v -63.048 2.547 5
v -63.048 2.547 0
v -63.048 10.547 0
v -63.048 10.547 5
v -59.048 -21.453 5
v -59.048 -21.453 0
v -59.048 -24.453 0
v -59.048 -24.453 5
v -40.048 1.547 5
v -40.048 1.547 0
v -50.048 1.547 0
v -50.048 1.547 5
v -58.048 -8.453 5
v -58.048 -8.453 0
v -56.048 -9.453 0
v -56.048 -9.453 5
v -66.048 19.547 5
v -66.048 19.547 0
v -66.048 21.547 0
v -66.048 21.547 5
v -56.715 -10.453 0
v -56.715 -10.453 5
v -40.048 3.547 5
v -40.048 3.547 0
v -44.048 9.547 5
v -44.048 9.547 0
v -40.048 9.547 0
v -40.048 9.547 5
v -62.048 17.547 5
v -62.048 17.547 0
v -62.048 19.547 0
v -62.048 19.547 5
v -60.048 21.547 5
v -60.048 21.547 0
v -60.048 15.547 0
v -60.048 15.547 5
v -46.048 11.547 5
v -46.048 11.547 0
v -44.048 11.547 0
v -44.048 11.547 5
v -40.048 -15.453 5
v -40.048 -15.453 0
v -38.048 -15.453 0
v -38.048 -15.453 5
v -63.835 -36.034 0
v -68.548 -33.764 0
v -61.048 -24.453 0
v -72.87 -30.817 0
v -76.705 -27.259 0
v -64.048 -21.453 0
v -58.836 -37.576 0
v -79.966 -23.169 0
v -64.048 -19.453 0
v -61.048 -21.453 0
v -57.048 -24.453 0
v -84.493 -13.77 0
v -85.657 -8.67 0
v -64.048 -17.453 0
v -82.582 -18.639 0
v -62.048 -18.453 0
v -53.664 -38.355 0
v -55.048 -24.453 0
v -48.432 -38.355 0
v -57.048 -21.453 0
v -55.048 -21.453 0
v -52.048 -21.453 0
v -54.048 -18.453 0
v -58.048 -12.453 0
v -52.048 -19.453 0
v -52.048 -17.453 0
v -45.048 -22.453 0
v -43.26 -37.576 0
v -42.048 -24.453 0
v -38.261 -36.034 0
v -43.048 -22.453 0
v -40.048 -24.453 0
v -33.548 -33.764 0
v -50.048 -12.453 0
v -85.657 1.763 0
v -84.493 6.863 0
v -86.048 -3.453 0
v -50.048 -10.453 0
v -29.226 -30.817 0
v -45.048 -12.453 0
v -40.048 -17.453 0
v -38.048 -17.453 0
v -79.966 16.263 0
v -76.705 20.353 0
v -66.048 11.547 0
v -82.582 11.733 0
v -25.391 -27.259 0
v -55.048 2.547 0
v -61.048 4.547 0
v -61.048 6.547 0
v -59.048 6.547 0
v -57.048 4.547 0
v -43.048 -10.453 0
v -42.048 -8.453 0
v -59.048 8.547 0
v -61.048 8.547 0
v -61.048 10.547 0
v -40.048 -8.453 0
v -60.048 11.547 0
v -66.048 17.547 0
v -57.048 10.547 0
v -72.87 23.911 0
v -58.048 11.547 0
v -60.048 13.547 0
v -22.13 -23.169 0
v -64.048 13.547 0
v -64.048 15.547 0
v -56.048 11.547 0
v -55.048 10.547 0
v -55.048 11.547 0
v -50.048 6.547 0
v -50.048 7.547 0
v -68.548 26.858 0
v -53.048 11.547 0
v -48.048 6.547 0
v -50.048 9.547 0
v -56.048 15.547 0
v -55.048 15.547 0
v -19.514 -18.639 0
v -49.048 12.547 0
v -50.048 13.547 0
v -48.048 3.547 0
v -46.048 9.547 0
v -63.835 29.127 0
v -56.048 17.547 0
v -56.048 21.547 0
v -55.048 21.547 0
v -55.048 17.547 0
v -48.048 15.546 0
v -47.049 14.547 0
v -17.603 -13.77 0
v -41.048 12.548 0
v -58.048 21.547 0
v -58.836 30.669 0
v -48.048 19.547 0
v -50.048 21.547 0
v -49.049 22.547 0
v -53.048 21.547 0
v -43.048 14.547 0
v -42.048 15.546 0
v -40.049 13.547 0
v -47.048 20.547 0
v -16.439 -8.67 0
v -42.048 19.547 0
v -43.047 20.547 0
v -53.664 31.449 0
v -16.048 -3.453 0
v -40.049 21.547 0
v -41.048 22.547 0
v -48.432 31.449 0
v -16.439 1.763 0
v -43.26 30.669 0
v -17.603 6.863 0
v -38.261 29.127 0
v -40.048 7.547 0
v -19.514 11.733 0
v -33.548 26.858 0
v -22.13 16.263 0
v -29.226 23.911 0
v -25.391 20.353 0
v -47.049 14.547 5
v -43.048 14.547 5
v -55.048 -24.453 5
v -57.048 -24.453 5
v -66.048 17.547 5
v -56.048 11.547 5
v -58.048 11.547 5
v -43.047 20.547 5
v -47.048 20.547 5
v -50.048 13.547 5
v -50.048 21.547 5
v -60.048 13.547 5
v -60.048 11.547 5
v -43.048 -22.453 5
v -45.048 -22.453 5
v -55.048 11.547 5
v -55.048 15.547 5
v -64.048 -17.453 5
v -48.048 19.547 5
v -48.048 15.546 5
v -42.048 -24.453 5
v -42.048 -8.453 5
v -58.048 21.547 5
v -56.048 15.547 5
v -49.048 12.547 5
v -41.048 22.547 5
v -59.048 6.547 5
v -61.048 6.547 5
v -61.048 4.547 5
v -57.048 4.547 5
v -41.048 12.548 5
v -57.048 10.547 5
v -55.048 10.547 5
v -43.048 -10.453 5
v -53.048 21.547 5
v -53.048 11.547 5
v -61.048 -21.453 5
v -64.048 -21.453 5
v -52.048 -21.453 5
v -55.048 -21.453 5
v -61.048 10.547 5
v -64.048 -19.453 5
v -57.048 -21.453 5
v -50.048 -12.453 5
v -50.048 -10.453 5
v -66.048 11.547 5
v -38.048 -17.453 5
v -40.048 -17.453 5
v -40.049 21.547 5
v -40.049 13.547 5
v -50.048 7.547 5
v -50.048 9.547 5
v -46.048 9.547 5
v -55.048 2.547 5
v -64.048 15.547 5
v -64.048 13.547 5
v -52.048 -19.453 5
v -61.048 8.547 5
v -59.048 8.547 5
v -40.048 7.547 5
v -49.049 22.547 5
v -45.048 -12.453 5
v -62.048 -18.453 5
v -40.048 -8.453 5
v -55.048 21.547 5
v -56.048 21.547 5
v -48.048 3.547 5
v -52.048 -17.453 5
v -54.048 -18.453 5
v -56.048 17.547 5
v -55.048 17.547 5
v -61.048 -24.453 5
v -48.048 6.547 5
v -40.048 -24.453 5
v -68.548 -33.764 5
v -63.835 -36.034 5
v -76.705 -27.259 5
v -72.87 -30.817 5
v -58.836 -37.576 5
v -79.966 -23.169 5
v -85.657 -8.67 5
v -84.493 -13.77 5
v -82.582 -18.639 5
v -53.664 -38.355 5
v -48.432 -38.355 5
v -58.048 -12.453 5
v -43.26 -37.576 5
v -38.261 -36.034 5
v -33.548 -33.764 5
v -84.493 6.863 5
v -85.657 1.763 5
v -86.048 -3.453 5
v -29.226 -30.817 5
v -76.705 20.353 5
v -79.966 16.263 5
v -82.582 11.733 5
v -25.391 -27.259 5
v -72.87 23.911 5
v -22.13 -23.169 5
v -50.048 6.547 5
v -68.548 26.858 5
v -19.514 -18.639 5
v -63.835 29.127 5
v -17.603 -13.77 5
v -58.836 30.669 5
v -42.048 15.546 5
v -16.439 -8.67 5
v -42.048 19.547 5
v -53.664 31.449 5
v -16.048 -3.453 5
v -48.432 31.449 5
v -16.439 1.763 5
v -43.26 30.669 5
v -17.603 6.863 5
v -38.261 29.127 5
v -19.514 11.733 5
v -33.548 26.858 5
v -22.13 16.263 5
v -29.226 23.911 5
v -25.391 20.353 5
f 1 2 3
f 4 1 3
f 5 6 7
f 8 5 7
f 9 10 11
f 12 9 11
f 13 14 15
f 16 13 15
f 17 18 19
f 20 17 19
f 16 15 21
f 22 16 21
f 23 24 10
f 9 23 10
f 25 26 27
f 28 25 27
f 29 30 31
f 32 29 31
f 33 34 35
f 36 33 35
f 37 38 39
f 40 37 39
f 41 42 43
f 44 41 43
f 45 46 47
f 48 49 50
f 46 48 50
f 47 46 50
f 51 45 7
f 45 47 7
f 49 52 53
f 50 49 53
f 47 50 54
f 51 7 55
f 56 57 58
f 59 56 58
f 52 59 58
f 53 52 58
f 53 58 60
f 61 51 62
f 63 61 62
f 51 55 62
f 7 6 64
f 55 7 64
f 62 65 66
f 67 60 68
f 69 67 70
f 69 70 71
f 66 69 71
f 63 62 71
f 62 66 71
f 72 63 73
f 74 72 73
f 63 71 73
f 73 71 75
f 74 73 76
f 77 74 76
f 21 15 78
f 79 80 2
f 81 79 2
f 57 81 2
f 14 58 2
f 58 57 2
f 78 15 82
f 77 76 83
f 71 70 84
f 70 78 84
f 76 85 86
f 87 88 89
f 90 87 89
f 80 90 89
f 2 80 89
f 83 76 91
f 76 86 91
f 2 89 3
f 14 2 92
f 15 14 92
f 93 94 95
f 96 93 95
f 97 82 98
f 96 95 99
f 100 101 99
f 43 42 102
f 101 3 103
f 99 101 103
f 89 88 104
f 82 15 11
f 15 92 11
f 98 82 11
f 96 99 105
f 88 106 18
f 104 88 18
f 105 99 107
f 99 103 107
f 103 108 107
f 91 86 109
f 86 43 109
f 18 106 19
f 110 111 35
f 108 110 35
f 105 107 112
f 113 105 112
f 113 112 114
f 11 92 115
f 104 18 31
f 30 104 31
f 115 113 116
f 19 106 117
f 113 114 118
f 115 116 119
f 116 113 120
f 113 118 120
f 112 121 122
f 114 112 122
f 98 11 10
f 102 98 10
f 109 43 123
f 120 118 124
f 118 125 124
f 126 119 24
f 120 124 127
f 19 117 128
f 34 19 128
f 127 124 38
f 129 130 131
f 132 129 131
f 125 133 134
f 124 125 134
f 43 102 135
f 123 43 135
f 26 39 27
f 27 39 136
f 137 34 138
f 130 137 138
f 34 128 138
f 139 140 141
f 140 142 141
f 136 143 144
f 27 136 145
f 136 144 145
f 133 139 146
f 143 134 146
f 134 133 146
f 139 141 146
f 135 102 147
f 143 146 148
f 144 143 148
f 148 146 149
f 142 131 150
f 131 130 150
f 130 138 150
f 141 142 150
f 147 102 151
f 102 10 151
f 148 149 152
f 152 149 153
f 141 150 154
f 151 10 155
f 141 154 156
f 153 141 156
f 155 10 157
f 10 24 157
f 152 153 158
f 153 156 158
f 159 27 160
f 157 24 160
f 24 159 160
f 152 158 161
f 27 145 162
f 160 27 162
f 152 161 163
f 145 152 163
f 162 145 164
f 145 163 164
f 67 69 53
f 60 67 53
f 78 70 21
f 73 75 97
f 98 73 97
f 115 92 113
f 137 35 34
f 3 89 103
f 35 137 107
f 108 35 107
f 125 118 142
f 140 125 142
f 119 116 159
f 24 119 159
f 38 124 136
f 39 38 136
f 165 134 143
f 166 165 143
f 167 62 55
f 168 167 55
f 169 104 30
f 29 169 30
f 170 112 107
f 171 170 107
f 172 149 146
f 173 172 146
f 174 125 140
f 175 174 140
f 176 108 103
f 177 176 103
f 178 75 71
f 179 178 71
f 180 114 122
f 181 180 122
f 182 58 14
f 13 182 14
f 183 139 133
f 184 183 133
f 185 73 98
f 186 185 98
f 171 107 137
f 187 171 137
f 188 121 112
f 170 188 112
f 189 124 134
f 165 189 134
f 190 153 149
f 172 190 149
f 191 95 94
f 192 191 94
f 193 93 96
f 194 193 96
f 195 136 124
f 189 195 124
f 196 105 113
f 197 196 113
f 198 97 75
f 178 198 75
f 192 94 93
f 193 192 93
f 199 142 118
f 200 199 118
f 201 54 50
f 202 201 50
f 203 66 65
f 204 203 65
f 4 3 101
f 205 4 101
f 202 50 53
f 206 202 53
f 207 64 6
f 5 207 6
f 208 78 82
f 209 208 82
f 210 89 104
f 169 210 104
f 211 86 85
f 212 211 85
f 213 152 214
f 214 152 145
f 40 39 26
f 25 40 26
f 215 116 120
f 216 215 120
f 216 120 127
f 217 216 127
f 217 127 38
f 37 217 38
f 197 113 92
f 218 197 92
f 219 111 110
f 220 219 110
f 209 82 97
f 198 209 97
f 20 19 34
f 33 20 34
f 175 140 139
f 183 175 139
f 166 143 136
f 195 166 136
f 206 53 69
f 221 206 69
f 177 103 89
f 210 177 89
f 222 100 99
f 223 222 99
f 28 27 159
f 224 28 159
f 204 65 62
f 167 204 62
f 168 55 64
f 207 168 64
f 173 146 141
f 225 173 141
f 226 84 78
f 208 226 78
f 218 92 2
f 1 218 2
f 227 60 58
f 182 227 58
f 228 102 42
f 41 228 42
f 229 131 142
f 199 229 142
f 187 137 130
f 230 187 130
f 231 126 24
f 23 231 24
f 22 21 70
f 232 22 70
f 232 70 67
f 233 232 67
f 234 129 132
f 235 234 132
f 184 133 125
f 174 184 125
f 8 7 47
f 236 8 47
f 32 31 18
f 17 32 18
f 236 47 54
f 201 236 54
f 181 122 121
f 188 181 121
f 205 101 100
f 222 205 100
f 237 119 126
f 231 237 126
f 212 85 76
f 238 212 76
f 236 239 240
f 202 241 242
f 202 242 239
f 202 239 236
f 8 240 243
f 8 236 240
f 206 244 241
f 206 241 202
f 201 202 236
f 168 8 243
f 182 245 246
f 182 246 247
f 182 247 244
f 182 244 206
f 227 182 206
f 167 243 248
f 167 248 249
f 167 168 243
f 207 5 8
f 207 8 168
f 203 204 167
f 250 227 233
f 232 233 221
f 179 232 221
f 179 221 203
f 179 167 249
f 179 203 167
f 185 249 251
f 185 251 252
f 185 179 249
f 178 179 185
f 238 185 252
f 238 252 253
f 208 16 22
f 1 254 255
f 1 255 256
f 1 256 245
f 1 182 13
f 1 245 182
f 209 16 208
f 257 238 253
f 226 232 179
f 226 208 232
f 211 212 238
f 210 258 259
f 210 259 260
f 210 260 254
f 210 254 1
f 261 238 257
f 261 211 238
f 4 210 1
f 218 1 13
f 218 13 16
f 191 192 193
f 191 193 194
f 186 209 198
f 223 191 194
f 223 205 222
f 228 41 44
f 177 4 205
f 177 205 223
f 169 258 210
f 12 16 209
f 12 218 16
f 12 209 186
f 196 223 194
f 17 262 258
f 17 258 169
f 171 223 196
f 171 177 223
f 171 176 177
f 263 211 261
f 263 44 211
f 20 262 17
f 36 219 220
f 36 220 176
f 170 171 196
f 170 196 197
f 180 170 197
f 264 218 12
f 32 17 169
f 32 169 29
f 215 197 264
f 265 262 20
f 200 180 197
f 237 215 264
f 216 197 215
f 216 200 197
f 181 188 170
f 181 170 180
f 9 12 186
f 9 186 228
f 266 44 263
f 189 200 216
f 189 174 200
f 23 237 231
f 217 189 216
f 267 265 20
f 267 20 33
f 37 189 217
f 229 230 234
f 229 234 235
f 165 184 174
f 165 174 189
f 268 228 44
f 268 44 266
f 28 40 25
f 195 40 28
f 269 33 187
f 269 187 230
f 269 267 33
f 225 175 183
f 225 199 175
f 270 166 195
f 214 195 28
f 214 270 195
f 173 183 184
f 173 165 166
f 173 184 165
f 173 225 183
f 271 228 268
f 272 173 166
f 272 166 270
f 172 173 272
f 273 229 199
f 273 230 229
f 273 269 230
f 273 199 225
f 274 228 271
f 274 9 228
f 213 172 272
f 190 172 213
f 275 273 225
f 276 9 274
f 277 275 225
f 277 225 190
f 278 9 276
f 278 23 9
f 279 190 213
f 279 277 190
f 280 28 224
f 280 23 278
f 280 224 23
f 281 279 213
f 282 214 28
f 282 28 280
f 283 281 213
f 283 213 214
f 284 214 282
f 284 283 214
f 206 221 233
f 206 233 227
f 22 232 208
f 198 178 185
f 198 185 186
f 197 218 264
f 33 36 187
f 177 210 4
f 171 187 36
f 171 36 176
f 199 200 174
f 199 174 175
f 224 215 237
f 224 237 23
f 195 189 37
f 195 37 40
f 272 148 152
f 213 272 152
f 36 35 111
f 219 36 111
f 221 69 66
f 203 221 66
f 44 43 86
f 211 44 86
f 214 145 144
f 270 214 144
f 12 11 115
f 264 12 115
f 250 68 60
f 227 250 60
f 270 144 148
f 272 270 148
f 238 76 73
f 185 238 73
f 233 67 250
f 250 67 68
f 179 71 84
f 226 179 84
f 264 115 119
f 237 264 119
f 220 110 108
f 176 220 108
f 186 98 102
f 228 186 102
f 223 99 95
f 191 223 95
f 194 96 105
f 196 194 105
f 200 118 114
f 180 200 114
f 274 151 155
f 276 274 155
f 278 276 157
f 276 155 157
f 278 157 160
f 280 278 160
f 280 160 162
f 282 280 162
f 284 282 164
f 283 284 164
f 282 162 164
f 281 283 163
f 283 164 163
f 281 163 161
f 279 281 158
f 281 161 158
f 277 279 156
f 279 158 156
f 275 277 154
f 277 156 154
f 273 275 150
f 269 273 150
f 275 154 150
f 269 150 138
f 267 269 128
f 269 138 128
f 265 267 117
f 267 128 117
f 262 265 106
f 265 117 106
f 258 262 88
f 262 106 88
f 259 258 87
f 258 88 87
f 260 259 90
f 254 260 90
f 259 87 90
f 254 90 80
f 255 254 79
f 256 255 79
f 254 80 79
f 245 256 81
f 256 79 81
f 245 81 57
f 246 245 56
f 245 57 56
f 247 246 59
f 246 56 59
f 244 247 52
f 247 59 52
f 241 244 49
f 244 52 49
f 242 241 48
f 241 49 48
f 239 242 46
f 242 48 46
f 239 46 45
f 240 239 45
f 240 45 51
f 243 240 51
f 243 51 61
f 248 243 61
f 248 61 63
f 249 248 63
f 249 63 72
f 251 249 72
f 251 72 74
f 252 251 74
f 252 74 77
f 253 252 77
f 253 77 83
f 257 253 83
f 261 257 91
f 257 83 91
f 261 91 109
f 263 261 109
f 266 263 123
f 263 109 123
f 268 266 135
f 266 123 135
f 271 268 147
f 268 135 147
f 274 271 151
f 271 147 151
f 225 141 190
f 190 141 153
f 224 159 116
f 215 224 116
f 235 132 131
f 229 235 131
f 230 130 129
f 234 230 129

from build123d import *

# Parameters (mm, degrees)
F0_R     = 35
F1_DEPTH = 5


with BuildPart() as f1:
    # F0 (on Top) → F1 (new body)
    with BuildSketch(Plane.XY):
        with Locations((-51.047989, -3.453226)):
            Circle(F0_R)
        Polygon((-59.047989, -24.453226), (-61.047989, -24.453226), (-61.047989, -21.453226), (-64.047989, -21.453226), (-64.047989, -19.453226), (-52.047989, -19.453226), (-52.047989, -21.453226), (-55.047989, -21.453226), (-55.047989, -24.453226), (-57.047989, -24.453226), (-57.047989, -21.453226), (-59.047989, -21.453226), align=None, mode=Mode.SUBTRACT)
        Polygon((-64.047989, -17.453226), (-58.047989, -8.45281), (-56.047989, -9.452658), (-56.714722, -10.452803), (-52.047989, -17.453226), (-54.047989, -18.453125), (-58.047951, -12.45274), (-62.047989, -18.453074), align=None, mode=Mode.SUBTRACT)
        Polygon((-43.047989, -10.453226), (-43.047989, -22.453226), (-45.047989, -22.453226), (-45.047989, -12.453226), (-50.047989, -12.453226), (-50.047989, -10.453226), align=None, mode=Mode.SUBTRACT)
        Polygon((-42.047989, -8.453226), (-40.047989, -8.453226), (-40.047989, -15.453226), (-38.047989, -15.453226), (-38.047989, -17.453226), (-40.047989, -17.453226), (-40.047989, -24.453226), (-42.047989, -24.453226), (-42.047989, -22.453226), align=None, mode=Mode.SUBTRACT)
        Polygon((-57.047989, 10.546774), (-55.047989, 10.546774), (-55.047989, 2.546774), (-63.047989, 2.546774), (-63.047989, 10.546774), (-61.047989, 10.546774), (-61.047989, 8.546774), (-59.047989, 8.546774), (-59.047989, 6.546774), (-61.047989, 6.546774), (-61.047989, 4.546774), (-57.047989, 4.546774), align=None, mode=Mode.SUBTRACT)
        Polygon((-66.047989, 19.546774), (-66.047989, 21.546774), (-60.047989, 21.546774), (-60.047989, 15.546774), (-64.047989, 15.546774), (-64.047989, 13.546774), (-60.047989, 13.546774), (-60.047989, 11.546774), (-66.047989, 11.546774), (-66.047989, 17.546774), (-62.047989, 17.546774), (-62.047989, 19.546774), align=None, mode=Mode.SUBTRACT)
        Polygon((-58.047989, 11.546774), (-58.047989, 21.546774), (-56.047989, 21.546774), (-56.047989, 17.546774), (-55.047989, 17.546774), (-55.047989, 21.546774), (-53.047989, 21.546774), (-53.047989, 11.546774), (-55.047989, 11.546774), (-55.047989, 15.546774), (-56.047989, 15.546774), (-56.047989, 11.546774), align=None, mode=Mode.SUBTRACT)
        Polygon((-50.047989, 1.546774), (-50.047989, 6.546774), (-48.047989, 6.546774), (-48.047989, 3.546774), (-40.047989, 3.546774), (-40.047989, 1.546774), align=None, mode=Mode.SUBTRACT)
        Polygon((-44.047989, 9.547076), (-40.047989, 9.547076), (-40.047989, 7.547076), (-50.047989, 7.547076), (-50.047989, 9.547076), (-46.047989, 9.547076), (-46.047989, 11.547076), (-44.047989, 11.547076), align=None, mode=Mode.SUBTRACT)
        Polygon((-43.048291, 14.546774), (-41.047536, 12.548133), (-49.04814, 12.546925), (-47.048593, 14.546774), align=None, mode=Mode.SUBTRACT)
        Polygon((-48.048291, 19.547076), (-48.048291, 15.546472), (-50.047989, 13.546774), (-50.047989, 21.546774), align=None, mode=Mode.SUBTRACT)
        Polygon((-47.047989, 20.546774), (-49.048593, 22.546774), (-41.047989, 22.546774), (-43.047385, 20.546774), align=None, mode=Mode.SUBTRACT)
        Polygon((-40.048593, 13.546774), (-42.048291, 15.546472), (-42.048291, 19.547076), (-40.048593, 21.546774), align=None, mode=Mode.SUBTRACT)
    extrude(amount=F1_DEPTH)


solid = f1.part
